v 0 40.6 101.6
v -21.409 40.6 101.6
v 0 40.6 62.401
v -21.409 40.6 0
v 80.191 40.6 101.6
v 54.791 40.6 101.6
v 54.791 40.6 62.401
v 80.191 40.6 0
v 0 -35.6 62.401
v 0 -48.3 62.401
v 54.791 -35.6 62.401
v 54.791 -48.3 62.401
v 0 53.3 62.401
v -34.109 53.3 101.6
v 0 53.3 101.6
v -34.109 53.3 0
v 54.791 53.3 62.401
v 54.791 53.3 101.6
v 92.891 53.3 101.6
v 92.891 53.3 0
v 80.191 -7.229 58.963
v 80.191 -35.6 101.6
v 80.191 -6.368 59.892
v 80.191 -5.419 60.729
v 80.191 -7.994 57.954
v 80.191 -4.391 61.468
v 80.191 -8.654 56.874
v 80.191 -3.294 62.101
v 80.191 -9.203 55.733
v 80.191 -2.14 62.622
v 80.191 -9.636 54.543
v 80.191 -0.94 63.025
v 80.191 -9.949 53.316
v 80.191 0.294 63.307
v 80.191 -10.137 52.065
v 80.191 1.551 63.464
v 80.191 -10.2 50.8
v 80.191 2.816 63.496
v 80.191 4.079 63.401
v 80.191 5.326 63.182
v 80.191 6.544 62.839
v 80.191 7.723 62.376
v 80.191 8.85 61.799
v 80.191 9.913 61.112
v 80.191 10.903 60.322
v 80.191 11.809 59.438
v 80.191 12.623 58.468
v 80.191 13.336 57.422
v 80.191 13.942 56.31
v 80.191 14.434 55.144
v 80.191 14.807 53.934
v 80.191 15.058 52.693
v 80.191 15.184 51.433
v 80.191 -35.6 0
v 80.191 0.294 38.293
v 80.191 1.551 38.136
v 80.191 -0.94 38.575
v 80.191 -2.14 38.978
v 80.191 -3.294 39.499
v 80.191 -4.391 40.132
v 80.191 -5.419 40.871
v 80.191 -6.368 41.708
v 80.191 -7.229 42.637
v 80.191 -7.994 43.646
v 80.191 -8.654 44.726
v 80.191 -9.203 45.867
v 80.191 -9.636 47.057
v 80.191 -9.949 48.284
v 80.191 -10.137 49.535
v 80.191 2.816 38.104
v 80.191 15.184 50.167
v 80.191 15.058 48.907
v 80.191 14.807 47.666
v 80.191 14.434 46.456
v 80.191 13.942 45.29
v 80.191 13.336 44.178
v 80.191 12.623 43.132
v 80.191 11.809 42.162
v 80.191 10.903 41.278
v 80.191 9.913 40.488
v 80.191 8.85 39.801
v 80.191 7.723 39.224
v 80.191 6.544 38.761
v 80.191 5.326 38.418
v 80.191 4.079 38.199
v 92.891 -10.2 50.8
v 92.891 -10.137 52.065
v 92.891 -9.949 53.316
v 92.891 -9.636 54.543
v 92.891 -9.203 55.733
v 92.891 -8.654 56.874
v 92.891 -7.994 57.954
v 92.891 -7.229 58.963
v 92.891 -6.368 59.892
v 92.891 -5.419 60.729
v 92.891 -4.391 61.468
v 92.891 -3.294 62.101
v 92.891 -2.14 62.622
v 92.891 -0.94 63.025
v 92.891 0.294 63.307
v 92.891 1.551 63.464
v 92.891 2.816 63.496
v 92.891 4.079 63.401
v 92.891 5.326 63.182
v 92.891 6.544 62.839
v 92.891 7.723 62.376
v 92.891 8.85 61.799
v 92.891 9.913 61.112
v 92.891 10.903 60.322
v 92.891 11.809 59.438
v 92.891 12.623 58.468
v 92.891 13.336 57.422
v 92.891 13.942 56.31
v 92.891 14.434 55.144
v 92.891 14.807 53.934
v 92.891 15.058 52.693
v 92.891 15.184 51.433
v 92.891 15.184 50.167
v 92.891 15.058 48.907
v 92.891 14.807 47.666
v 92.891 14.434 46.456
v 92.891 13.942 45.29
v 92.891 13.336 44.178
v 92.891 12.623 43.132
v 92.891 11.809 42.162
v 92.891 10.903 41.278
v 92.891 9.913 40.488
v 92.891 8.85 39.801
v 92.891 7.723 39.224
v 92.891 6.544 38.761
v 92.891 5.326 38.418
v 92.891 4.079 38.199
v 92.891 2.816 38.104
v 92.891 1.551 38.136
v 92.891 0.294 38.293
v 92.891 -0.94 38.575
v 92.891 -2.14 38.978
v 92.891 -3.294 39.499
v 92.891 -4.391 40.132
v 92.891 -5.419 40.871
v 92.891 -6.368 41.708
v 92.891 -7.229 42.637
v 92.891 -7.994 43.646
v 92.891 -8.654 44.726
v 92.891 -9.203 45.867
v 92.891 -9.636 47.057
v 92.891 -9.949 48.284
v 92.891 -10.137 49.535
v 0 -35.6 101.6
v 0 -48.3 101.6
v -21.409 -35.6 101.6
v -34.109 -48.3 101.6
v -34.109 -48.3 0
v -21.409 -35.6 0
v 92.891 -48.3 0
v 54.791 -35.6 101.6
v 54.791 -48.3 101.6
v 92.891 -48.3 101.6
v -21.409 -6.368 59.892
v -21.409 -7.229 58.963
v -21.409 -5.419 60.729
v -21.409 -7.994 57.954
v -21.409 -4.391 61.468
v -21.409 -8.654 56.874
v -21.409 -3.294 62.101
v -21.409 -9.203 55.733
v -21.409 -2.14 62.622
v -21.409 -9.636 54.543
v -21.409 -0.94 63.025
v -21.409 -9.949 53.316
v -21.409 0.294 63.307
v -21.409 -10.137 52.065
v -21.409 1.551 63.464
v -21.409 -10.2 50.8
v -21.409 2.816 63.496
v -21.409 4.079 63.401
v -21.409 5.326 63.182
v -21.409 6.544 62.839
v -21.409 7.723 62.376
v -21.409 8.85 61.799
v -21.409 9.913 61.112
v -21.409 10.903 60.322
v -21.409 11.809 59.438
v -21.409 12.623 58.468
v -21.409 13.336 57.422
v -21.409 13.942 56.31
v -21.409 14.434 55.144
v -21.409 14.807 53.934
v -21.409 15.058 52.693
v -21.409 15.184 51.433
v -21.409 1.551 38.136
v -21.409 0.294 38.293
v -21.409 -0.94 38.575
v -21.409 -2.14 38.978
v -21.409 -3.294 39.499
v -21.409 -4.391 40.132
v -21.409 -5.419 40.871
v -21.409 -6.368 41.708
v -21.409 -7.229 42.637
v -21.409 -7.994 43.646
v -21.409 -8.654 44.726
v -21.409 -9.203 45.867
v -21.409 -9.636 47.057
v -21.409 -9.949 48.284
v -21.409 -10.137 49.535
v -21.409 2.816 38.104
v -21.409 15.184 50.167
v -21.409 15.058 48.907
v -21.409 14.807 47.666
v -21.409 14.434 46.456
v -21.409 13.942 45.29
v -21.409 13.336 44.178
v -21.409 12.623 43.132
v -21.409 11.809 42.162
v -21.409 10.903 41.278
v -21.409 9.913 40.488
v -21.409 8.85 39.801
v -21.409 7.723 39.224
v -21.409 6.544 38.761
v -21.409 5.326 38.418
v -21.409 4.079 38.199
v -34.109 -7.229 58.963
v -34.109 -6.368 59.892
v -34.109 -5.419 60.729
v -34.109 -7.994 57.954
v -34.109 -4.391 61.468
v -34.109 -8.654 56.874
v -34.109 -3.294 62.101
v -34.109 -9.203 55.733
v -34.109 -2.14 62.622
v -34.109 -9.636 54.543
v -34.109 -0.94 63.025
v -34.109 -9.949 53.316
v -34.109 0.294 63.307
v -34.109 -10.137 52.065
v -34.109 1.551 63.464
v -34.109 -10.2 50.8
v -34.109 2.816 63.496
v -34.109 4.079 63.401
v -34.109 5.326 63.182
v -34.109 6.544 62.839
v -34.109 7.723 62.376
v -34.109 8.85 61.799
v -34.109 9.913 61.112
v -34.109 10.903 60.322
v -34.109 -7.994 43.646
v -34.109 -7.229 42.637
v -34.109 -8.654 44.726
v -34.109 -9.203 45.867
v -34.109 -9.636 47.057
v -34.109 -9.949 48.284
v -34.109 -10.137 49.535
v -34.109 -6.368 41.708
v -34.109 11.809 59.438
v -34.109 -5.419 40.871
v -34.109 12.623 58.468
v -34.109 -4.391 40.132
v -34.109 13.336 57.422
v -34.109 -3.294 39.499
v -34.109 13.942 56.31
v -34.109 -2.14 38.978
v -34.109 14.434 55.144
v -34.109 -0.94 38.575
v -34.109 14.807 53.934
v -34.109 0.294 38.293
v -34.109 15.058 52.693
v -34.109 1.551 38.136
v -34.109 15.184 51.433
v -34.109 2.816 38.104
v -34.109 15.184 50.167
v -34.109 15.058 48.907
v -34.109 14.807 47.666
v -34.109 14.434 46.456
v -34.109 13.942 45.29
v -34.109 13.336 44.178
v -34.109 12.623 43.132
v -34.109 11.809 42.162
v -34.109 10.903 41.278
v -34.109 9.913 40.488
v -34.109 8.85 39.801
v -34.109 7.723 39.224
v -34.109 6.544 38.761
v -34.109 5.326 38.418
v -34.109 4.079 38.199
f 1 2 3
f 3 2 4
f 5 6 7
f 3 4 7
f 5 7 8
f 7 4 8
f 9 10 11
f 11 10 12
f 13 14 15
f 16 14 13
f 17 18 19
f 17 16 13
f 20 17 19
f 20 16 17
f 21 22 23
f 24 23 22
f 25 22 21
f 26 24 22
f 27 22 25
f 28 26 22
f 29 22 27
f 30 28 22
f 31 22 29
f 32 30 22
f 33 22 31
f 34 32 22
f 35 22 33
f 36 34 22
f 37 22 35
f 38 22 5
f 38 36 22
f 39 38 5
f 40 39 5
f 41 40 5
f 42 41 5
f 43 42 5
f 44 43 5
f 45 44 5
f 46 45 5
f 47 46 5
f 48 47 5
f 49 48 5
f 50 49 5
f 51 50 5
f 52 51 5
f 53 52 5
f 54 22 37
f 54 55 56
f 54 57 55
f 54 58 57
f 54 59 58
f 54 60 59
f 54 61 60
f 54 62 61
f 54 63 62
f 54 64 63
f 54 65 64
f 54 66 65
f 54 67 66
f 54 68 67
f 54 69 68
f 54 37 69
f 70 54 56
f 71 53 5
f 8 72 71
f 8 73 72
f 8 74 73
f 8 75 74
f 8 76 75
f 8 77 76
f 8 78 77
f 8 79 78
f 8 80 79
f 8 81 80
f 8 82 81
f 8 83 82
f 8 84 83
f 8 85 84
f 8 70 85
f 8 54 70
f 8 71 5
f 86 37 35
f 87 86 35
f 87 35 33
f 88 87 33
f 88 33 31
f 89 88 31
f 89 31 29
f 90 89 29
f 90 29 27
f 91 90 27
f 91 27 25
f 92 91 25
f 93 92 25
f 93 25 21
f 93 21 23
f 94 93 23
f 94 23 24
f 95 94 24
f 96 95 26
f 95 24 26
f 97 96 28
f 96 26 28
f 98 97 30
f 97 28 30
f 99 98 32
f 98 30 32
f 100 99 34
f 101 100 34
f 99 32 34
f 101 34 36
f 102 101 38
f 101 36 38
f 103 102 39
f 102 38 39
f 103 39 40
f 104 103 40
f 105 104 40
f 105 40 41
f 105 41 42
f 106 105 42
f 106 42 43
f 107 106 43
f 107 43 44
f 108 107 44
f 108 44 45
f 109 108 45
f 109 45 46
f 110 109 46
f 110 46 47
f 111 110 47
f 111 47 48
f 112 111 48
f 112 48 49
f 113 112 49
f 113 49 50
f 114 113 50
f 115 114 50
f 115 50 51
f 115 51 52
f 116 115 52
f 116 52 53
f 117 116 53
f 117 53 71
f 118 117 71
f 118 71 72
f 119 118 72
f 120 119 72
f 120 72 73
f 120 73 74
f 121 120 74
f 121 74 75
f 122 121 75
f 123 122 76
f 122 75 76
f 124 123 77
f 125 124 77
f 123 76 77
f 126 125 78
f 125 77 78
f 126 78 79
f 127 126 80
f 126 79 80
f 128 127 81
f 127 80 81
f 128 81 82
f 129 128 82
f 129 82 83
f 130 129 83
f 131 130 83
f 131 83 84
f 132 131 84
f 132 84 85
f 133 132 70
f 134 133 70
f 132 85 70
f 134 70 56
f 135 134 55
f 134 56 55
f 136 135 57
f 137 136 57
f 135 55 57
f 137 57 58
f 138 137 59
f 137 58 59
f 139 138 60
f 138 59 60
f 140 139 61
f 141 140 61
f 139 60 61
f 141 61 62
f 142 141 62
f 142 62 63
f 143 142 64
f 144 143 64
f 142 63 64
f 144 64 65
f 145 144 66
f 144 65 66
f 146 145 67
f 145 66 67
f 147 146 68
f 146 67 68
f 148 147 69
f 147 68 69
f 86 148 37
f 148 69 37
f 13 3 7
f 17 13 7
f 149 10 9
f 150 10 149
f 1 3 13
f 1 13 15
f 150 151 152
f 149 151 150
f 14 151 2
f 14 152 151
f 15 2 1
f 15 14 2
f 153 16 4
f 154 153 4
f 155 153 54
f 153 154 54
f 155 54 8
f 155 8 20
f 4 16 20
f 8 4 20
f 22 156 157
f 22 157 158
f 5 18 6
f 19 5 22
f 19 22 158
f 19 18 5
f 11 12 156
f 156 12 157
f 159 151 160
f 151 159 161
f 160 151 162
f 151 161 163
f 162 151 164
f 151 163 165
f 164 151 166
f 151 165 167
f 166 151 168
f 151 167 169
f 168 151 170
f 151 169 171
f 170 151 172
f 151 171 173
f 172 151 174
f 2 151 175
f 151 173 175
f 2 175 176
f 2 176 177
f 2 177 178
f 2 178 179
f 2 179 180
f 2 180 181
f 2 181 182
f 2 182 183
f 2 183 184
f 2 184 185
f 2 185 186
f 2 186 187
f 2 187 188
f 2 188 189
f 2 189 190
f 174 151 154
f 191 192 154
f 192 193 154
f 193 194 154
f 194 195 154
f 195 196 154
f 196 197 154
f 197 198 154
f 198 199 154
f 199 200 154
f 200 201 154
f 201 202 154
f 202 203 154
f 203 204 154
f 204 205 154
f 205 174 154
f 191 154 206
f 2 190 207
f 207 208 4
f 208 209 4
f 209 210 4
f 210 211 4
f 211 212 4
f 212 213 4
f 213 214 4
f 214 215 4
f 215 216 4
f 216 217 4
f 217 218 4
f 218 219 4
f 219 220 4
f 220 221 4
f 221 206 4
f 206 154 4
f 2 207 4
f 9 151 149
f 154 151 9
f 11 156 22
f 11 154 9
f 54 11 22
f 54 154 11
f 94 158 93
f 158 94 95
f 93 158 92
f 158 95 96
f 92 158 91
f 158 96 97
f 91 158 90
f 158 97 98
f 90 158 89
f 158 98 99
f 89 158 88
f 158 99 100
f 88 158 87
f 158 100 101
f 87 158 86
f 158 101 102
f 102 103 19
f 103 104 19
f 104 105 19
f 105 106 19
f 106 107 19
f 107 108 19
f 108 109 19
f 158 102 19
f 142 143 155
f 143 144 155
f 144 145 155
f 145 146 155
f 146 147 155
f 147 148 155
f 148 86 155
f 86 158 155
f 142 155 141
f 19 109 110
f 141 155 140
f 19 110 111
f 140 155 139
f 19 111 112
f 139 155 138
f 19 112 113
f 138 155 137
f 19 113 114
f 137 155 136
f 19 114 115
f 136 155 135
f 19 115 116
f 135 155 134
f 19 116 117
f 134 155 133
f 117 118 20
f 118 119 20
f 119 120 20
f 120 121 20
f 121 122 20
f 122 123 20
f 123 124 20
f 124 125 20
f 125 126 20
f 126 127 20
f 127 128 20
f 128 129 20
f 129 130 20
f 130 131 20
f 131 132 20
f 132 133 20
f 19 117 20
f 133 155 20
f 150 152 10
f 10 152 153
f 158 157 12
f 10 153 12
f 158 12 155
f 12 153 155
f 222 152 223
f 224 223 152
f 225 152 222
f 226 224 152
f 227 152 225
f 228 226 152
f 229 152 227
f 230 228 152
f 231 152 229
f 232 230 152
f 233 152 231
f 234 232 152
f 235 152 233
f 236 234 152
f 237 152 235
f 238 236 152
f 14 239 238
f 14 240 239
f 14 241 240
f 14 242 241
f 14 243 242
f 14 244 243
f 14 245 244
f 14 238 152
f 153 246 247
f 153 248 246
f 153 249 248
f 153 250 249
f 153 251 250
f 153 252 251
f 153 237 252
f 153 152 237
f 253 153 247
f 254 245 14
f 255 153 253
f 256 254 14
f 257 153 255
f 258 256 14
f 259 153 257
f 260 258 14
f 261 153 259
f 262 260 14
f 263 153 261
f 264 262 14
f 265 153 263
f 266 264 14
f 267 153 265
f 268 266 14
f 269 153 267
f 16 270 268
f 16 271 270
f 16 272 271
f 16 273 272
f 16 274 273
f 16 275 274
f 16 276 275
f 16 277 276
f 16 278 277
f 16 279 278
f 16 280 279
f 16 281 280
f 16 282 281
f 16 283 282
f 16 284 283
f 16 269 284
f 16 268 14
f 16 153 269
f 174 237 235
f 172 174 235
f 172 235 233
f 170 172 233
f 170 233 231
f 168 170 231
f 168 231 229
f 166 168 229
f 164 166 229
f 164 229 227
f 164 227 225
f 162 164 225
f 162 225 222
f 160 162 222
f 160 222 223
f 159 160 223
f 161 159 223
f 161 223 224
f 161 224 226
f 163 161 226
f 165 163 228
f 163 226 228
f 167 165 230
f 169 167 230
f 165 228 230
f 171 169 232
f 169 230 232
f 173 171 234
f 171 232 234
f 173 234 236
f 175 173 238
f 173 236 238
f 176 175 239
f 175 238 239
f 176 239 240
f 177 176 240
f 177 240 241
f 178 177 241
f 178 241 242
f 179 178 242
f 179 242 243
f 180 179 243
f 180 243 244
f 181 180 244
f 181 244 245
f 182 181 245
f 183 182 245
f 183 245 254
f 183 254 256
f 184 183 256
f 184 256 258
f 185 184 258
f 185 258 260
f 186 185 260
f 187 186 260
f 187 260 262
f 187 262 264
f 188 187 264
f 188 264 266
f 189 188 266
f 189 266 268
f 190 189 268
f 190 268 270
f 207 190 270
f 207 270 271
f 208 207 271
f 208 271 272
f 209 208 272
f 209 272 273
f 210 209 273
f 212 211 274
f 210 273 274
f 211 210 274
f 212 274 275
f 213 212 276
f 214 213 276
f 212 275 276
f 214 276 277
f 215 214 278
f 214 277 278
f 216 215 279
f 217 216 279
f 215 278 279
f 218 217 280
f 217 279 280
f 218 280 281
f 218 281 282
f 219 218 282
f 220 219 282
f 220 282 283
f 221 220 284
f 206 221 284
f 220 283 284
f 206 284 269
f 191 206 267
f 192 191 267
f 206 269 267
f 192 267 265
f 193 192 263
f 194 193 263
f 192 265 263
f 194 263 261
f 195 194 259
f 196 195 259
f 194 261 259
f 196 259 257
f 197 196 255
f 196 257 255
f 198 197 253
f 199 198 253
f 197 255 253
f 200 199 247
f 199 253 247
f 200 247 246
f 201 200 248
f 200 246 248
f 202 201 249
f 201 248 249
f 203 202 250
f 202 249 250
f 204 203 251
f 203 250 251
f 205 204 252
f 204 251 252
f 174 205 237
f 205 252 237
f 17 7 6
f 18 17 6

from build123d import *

# Parameters (mm, degrees)
F0_W     = 127
F0_H     = 101.6
F0_W_2   = 101.6
F0_H_2   = 76.2
F1_DEPTH = 101.6
F2_W     = 54.790769
F2_H     = 39.199134
F3_DEPTH = 152.4
F4_R     = 12.7
F5_DEPTH = 203.2


with BuildPart() as f1:
    # F0 (on Top) → F1 (new body)
    with BuildSketch(Plane.XY):
        with Locations((29.390769, 2.499611)):
            Rectangle(F0_W, F0_H)
        with Locations((29.390769, 2.499611)):
            Rectangle(F0_W_2, F0_H_2, mode=Mode.SUBTRACT)
    extrude(amount=F1_DEPTH)

    # F2 (on face) → F3 (cut)
    with BuildSketch(Plane.XZ.offset(48.300389)):
        with Locations((27.395384, 82.000433)):
            Rectangle(F2_W, F2_H)
    extrude(amount=-F3_DEPTH, mode=Mode.SUBTRACT)

    # F4 (on face) → F5 (cut)
    with BuildSketch(Plane(origin=(-34.109231, 0, 0), x_dir=(0, -1, 0), z_dir=(-1, 0, 0))):
        with Locations((-2.499611, 50.8)):
            Circle(F4_R)
    extrude(amount=-F5_DEPTH, mode=Mode.SUBTRACT)


solid = f1.part
